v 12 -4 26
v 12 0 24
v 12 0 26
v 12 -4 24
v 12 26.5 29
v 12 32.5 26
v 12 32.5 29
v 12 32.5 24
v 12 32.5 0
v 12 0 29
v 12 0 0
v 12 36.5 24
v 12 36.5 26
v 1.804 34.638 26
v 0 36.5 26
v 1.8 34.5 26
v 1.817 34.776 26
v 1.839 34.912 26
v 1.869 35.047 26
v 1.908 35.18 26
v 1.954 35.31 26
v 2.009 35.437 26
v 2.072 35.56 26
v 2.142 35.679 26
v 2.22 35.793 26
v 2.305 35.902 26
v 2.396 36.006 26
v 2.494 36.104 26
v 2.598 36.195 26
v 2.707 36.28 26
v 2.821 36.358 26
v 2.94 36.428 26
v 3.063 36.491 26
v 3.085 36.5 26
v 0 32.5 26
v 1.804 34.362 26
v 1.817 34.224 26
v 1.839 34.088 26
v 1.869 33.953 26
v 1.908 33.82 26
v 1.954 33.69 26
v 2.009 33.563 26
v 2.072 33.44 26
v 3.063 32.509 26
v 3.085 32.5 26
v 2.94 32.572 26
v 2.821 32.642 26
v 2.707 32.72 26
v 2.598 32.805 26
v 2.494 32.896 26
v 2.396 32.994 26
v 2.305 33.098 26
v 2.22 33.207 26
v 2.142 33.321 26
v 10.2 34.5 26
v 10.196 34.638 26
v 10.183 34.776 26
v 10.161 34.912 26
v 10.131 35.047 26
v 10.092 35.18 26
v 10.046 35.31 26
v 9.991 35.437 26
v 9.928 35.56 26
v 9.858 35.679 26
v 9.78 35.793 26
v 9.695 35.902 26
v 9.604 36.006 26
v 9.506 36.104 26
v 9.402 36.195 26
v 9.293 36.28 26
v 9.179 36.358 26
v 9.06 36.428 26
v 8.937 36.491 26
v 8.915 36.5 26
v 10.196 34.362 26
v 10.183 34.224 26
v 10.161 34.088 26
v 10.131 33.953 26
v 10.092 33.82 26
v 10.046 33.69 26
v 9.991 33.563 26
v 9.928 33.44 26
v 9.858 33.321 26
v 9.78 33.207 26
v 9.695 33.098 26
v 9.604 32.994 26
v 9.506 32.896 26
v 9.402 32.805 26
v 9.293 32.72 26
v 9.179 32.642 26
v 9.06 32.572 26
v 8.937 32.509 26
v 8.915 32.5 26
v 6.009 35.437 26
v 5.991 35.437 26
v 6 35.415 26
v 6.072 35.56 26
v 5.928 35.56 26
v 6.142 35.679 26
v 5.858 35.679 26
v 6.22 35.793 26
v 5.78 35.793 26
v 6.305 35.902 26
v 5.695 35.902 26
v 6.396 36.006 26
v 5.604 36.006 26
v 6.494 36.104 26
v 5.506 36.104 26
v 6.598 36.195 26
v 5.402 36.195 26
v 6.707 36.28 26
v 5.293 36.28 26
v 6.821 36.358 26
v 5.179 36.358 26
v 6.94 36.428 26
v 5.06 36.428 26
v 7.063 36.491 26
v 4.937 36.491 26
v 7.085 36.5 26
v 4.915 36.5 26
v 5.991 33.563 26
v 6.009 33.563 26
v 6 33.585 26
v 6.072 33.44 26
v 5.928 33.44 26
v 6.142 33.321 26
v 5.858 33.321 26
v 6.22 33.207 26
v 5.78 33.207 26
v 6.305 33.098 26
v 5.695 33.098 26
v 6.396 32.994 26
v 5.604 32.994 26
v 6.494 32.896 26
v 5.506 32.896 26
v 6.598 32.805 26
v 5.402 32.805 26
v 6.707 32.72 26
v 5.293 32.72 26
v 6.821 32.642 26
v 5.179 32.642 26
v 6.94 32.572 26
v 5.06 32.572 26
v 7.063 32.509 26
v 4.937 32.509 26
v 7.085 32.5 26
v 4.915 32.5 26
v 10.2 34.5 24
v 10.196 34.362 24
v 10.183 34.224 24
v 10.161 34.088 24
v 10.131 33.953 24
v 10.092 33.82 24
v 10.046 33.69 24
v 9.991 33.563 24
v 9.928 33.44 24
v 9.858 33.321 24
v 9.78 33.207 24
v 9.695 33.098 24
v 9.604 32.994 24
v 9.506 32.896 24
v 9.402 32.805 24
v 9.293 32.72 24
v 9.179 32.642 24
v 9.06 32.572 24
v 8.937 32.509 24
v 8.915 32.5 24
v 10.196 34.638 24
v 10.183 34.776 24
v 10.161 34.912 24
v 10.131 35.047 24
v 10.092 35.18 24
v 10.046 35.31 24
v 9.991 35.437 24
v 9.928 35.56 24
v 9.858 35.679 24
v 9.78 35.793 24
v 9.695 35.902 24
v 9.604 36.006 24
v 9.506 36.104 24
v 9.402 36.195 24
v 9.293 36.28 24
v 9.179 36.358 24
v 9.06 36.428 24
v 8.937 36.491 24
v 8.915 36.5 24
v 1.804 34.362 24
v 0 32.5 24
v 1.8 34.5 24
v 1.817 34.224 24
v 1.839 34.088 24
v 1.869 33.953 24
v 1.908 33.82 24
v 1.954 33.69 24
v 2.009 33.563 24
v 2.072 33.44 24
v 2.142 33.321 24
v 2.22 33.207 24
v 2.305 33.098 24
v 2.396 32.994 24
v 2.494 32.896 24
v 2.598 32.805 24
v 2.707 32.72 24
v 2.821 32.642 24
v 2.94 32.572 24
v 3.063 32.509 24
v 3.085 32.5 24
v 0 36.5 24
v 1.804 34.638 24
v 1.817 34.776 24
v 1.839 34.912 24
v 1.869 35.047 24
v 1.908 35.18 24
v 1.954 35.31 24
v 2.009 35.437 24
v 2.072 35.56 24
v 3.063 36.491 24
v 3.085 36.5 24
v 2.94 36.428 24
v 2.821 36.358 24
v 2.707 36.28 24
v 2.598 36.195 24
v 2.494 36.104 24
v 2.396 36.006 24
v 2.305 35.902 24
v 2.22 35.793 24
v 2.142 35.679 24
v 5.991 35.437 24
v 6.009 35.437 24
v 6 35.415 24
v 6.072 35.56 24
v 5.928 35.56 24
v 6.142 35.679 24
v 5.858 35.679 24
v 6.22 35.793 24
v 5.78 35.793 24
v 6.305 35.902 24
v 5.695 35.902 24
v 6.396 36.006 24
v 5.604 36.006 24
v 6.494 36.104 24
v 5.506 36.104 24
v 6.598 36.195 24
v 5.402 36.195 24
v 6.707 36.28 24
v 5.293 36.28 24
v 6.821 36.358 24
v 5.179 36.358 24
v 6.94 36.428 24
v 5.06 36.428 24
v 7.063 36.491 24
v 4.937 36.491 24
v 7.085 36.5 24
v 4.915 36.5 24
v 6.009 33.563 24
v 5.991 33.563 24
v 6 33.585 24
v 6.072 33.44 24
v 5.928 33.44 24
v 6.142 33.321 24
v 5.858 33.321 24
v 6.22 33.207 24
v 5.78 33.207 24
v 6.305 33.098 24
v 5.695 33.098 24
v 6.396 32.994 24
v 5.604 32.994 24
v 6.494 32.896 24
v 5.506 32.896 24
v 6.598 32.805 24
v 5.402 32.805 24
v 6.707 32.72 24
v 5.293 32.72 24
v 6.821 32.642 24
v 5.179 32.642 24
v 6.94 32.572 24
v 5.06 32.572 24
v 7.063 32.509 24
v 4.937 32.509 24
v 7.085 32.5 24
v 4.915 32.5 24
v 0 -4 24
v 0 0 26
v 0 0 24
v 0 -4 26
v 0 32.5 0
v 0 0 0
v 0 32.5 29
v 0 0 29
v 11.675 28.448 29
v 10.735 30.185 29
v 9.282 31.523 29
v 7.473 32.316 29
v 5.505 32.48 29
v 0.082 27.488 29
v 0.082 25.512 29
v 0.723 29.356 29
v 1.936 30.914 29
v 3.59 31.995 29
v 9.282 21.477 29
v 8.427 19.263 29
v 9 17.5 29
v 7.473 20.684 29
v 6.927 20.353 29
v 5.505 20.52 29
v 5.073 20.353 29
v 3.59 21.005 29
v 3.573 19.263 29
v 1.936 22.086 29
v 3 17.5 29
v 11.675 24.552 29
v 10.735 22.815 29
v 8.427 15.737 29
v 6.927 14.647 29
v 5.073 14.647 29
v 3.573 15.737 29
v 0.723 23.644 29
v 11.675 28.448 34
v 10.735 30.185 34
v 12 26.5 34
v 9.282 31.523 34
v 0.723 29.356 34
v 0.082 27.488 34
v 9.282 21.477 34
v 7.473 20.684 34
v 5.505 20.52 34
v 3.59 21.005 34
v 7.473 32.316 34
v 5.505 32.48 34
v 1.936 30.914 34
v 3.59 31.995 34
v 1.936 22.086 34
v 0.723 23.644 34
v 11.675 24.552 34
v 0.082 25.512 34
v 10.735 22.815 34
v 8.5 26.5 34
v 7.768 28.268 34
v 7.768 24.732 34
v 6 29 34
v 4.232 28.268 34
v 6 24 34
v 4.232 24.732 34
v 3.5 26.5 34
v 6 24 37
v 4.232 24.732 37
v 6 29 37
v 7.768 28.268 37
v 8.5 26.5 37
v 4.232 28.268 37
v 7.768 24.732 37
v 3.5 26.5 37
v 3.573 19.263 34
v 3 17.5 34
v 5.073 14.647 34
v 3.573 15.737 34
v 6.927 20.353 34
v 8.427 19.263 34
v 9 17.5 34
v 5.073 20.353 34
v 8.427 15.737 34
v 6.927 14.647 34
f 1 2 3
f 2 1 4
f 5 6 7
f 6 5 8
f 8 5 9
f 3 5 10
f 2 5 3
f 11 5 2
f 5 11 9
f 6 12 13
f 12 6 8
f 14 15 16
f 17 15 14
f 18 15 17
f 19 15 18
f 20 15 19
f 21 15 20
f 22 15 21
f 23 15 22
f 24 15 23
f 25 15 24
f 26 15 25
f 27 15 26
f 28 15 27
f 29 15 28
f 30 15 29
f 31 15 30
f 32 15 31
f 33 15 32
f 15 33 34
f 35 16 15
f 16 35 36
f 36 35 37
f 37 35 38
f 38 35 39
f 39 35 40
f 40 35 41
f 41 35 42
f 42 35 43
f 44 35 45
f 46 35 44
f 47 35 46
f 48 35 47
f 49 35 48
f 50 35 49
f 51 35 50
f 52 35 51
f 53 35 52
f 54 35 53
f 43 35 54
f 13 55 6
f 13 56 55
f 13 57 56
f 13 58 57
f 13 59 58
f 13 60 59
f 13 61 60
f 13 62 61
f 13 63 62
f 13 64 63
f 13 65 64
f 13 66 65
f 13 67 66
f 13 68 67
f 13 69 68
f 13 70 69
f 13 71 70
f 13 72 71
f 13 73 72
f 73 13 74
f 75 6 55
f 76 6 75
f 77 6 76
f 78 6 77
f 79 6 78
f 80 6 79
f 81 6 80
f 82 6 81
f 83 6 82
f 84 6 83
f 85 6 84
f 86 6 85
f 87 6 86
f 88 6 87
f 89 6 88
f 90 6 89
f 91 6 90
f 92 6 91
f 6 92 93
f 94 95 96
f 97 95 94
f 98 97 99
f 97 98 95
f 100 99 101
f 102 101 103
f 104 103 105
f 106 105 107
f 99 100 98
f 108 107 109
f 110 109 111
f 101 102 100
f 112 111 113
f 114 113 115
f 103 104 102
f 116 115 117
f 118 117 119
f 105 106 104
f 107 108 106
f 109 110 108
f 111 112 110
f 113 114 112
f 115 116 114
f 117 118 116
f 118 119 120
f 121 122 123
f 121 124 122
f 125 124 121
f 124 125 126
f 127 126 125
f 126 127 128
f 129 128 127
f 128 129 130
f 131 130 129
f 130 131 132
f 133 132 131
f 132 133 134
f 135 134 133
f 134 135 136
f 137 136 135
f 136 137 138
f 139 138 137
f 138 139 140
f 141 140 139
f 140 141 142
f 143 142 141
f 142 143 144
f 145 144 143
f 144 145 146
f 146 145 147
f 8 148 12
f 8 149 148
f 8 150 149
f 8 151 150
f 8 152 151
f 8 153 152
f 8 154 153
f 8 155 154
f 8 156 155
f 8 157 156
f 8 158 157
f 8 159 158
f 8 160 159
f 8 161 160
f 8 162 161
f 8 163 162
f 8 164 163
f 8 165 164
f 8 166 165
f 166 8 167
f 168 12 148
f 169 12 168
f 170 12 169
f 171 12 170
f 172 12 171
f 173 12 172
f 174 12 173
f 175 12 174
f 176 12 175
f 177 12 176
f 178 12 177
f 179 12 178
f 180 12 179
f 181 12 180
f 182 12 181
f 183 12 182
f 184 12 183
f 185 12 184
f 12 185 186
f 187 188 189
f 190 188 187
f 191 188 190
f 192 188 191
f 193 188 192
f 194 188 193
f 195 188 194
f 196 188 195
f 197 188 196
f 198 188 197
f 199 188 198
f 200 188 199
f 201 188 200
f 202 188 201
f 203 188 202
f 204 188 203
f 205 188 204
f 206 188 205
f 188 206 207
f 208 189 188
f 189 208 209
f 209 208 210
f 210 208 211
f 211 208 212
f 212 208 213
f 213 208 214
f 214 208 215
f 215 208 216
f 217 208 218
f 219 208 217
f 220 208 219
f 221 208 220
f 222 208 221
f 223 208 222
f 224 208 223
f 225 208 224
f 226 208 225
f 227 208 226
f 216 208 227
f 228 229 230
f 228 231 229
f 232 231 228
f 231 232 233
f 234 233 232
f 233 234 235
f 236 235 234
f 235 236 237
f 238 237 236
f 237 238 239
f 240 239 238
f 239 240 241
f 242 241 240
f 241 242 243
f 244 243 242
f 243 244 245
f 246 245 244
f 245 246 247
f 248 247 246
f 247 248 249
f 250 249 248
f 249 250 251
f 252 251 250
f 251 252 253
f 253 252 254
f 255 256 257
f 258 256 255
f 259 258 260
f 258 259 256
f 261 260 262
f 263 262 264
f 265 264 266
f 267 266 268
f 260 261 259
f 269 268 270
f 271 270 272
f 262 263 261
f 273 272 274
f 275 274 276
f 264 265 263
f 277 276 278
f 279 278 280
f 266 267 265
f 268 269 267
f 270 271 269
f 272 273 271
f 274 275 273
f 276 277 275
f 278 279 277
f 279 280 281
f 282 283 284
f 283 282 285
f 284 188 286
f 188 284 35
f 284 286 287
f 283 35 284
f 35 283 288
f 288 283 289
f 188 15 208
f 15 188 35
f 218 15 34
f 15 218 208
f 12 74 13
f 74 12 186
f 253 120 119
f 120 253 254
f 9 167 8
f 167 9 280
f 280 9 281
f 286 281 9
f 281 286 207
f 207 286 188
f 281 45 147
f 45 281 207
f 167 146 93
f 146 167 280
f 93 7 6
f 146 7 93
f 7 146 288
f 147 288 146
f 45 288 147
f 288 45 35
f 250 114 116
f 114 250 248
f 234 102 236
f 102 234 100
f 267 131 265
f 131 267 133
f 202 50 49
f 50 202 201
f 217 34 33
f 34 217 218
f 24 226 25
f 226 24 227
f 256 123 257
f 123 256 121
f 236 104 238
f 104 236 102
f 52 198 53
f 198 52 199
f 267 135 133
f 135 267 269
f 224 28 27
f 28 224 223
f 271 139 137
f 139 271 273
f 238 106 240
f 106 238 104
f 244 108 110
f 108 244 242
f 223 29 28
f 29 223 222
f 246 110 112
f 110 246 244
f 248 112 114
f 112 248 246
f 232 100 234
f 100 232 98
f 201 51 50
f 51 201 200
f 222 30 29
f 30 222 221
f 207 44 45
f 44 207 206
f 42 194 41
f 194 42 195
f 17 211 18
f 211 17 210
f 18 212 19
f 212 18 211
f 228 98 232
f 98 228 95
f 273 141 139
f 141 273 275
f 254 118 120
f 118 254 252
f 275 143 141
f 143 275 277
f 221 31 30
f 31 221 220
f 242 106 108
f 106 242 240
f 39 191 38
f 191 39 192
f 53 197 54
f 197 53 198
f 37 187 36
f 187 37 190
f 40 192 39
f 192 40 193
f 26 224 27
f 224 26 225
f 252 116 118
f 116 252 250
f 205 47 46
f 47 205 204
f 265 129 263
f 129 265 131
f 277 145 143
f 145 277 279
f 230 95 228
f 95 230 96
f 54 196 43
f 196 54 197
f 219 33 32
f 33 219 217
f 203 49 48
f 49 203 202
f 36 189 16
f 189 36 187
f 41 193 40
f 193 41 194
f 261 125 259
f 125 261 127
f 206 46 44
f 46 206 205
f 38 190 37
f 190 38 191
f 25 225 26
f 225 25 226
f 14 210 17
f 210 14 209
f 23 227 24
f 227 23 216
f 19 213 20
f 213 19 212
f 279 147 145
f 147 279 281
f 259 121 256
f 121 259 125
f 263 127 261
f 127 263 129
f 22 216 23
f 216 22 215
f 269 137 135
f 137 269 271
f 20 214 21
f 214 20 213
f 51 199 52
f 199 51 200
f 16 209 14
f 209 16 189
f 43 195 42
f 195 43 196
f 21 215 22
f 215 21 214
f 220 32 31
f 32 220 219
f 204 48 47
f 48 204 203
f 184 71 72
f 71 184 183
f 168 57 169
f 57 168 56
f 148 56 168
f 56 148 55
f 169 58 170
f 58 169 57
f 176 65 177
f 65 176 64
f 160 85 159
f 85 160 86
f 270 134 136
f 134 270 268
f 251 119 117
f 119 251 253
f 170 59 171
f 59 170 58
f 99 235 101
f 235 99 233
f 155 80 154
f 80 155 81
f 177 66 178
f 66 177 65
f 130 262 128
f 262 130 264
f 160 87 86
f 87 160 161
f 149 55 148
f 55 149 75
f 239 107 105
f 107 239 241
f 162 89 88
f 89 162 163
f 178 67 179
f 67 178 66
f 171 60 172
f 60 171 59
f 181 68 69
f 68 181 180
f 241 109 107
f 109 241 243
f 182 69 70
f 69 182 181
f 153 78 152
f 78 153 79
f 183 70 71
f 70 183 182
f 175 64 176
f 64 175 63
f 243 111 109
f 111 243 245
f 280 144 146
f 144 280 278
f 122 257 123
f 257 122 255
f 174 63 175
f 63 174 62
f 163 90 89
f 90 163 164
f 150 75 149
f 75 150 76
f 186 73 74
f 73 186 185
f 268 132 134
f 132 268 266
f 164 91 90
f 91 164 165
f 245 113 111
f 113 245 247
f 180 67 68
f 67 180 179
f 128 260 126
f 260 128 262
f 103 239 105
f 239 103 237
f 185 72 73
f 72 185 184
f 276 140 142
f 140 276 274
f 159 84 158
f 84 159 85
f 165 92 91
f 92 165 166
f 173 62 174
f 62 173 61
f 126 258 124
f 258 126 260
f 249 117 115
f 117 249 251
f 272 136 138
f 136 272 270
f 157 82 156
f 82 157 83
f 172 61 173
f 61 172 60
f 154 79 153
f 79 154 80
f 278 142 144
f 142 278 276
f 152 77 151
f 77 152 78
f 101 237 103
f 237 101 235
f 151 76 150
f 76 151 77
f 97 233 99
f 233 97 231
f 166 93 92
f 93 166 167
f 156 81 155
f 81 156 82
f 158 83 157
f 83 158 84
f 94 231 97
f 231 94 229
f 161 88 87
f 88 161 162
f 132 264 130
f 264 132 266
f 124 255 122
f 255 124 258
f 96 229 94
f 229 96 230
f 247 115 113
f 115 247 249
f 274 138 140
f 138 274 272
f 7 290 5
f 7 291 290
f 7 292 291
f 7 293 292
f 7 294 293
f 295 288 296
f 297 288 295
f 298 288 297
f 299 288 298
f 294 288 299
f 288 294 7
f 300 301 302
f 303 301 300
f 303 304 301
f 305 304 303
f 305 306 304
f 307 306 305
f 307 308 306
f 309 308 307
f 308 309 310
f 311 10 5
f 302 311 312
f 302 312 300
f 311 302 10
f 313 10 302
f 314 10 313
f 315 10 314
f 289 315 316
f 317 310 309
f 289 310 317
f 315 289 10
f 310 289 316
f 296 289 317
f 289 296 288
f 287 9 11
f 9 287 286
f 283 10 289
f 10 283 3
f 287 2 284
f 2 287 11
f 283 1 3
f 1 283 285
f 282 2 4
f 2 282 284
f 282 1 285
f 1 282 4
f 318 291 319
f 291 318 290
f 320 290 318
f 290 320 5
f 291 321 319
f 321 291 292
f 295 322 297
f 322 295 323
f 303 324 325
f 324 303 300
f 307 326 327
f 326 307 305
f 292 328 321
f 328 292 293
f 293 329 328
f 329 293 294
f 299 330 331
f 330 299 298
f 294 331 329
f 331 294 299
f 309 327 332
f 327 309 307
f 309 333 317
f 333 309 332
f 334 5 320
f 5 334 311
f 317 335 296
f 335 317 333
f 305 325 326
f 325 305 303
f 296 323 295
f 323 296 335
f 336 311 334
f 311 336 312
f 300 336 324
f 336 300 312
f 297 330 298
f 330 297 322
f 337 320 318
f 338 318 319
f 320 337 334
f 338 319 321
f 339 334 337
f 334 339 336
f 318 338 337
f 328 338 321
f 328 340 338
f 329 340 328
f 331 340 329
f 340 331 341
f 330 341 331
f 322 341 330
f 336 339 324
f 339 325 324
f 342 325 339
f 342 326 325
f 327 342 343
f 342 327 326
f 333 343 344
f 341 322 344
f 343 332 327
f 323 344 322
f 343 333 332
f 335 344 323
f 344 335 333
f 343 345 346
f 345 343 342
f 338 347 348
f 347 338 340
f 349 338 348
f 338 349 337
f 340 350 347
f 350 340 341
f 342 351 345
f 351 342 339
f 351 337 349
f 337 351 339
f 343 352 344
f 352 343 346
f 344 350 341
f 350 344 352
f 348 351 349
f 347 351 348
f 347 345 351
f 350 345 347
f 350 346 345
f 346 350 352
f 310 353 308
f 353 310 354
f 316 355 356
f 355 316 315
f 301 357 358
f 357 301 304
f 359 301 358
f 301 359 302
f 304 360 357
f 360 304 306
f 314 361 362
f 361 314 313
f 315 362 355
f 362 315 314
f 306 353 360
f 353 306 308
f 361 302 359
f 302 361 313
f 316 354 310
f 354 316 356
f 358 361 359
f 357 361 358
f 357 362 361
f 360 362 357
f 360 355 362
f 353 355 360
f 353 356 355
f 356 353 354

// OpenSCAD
/*
 ___   ___        ___       __  ___   ___                            
|   |=|_.'   .'|=|_.'  .'|=|  ||   | |   |  .'|=|`.                  
`.  |      .'  |  ___.'  | |  ||   | |   |.'  | |  `.                
  `.|=|`.  |   |=|_.'|   |=|.' |   | |   ||   | |   |                
 ___  |  `.|   |  ___|   |  |`.`.  | |  .'`.  | |  .'                
 `._|=|___||___|=|_.'|___|  |_|  `.|=|.'    `.|=|.'                  
                                                                     
       _        ___  ___   ___     ___                 ___ ___   ___ 
  .'|=| `.  .'|`._|=|   |=|_.'.'|=|_.'  .'| |`.   .'|=|_.'|   |=|_.' 
.'  | | .'.'  |     |   |   .'  |     .'  | |  `.'  |  ___`.  |      
|   |=|'. |   |     |   |   |   |     |   |=|   |   |=|_.'  `.|=|`.  
|   | |  ||   |     `.  |   `.  |  ___|   | |   |   |  ___ ___  |  `.
|___|=|_.'|___|       `.|     `.|=|_.'|___| |___|___|=|_.' `._|=|___|
                                                                     
*/

/*~*~*~*~*~*~*~*~*~*~*~*~Servo Design~*~*~*~*~*~*~*~*~*~*~*~*/

/* Description*/
//This code adapted from work protected by the Collective Commons Attribution-ShareAlike 3.0 Unported license http://creativecommons.org/licenses/by-sa/3.0/legalcode. 
//I made changes to this work in order to accurately reflect the servo motors used in the RaspberrySpy project.
epsilon=.001;

module miniservo(base_x, base_y, base_z, 
	fix_offset, fix_y, fix_z,
	cyl_height, cyl_radius, cyl_offset,
	axe_height, axe_radius) {
	color("LightBlue") cube([base_x, base_y, base_z]);
	color("LightBlue") translate([0, -fix_y, base_z - fix_offset]) 
		cube([base_x, fix_y, fix_z]);
	color("LightBlue") translate([0, base_y, base_z - fix_offset]) 	
difference(){
	cube([base_x, fix_y, fix_z]);
	translate([4,2,0]) cylinder(r=2.2,h=fix_z+1, $fn=100);
	translate([8,2,0]) cylinder(r=2.2,h=fix_z+1, $fn=100);
}

	color("grey") translate([base_x/2, base_y-cyl_offset, base_z]) 
		cylinder(cyl_height, cyl_radius, cyl_radius);
	color("White") translate([base_x/2, base_y-cyl_offset, base_z+cyl_height]) 
		cylinder(axe_height, axe_radius, axe_radius);
}

module TG9() {
	base_x = 12; base_y = 32.5; base_z = 29;
	fix_offset = 5; fix_y = 4; fix_z = 2;
	cyl_height = 5; cyl_radius = 6;	cyl_offset = 6;
	smallcyl_radius = 3; smallcyl_offset = 15;
	axe_height = 3; axe_radius = 2.5;
	union() {
		miniservo(base_x, base_y, base_z,
		 fix_offset, fix_y, fix_z,
		 cyl_height, cyl_radius, cyl_offset,
		 axe_height, axe_radius);
		
		translate([base_x/2, base_y-smallcyl_offset,base_z]) color("Blue") cylinder(cyl_height, smallcyl_radius, smallcyl_radius);
	}
}

TG9(); //Generate servo
